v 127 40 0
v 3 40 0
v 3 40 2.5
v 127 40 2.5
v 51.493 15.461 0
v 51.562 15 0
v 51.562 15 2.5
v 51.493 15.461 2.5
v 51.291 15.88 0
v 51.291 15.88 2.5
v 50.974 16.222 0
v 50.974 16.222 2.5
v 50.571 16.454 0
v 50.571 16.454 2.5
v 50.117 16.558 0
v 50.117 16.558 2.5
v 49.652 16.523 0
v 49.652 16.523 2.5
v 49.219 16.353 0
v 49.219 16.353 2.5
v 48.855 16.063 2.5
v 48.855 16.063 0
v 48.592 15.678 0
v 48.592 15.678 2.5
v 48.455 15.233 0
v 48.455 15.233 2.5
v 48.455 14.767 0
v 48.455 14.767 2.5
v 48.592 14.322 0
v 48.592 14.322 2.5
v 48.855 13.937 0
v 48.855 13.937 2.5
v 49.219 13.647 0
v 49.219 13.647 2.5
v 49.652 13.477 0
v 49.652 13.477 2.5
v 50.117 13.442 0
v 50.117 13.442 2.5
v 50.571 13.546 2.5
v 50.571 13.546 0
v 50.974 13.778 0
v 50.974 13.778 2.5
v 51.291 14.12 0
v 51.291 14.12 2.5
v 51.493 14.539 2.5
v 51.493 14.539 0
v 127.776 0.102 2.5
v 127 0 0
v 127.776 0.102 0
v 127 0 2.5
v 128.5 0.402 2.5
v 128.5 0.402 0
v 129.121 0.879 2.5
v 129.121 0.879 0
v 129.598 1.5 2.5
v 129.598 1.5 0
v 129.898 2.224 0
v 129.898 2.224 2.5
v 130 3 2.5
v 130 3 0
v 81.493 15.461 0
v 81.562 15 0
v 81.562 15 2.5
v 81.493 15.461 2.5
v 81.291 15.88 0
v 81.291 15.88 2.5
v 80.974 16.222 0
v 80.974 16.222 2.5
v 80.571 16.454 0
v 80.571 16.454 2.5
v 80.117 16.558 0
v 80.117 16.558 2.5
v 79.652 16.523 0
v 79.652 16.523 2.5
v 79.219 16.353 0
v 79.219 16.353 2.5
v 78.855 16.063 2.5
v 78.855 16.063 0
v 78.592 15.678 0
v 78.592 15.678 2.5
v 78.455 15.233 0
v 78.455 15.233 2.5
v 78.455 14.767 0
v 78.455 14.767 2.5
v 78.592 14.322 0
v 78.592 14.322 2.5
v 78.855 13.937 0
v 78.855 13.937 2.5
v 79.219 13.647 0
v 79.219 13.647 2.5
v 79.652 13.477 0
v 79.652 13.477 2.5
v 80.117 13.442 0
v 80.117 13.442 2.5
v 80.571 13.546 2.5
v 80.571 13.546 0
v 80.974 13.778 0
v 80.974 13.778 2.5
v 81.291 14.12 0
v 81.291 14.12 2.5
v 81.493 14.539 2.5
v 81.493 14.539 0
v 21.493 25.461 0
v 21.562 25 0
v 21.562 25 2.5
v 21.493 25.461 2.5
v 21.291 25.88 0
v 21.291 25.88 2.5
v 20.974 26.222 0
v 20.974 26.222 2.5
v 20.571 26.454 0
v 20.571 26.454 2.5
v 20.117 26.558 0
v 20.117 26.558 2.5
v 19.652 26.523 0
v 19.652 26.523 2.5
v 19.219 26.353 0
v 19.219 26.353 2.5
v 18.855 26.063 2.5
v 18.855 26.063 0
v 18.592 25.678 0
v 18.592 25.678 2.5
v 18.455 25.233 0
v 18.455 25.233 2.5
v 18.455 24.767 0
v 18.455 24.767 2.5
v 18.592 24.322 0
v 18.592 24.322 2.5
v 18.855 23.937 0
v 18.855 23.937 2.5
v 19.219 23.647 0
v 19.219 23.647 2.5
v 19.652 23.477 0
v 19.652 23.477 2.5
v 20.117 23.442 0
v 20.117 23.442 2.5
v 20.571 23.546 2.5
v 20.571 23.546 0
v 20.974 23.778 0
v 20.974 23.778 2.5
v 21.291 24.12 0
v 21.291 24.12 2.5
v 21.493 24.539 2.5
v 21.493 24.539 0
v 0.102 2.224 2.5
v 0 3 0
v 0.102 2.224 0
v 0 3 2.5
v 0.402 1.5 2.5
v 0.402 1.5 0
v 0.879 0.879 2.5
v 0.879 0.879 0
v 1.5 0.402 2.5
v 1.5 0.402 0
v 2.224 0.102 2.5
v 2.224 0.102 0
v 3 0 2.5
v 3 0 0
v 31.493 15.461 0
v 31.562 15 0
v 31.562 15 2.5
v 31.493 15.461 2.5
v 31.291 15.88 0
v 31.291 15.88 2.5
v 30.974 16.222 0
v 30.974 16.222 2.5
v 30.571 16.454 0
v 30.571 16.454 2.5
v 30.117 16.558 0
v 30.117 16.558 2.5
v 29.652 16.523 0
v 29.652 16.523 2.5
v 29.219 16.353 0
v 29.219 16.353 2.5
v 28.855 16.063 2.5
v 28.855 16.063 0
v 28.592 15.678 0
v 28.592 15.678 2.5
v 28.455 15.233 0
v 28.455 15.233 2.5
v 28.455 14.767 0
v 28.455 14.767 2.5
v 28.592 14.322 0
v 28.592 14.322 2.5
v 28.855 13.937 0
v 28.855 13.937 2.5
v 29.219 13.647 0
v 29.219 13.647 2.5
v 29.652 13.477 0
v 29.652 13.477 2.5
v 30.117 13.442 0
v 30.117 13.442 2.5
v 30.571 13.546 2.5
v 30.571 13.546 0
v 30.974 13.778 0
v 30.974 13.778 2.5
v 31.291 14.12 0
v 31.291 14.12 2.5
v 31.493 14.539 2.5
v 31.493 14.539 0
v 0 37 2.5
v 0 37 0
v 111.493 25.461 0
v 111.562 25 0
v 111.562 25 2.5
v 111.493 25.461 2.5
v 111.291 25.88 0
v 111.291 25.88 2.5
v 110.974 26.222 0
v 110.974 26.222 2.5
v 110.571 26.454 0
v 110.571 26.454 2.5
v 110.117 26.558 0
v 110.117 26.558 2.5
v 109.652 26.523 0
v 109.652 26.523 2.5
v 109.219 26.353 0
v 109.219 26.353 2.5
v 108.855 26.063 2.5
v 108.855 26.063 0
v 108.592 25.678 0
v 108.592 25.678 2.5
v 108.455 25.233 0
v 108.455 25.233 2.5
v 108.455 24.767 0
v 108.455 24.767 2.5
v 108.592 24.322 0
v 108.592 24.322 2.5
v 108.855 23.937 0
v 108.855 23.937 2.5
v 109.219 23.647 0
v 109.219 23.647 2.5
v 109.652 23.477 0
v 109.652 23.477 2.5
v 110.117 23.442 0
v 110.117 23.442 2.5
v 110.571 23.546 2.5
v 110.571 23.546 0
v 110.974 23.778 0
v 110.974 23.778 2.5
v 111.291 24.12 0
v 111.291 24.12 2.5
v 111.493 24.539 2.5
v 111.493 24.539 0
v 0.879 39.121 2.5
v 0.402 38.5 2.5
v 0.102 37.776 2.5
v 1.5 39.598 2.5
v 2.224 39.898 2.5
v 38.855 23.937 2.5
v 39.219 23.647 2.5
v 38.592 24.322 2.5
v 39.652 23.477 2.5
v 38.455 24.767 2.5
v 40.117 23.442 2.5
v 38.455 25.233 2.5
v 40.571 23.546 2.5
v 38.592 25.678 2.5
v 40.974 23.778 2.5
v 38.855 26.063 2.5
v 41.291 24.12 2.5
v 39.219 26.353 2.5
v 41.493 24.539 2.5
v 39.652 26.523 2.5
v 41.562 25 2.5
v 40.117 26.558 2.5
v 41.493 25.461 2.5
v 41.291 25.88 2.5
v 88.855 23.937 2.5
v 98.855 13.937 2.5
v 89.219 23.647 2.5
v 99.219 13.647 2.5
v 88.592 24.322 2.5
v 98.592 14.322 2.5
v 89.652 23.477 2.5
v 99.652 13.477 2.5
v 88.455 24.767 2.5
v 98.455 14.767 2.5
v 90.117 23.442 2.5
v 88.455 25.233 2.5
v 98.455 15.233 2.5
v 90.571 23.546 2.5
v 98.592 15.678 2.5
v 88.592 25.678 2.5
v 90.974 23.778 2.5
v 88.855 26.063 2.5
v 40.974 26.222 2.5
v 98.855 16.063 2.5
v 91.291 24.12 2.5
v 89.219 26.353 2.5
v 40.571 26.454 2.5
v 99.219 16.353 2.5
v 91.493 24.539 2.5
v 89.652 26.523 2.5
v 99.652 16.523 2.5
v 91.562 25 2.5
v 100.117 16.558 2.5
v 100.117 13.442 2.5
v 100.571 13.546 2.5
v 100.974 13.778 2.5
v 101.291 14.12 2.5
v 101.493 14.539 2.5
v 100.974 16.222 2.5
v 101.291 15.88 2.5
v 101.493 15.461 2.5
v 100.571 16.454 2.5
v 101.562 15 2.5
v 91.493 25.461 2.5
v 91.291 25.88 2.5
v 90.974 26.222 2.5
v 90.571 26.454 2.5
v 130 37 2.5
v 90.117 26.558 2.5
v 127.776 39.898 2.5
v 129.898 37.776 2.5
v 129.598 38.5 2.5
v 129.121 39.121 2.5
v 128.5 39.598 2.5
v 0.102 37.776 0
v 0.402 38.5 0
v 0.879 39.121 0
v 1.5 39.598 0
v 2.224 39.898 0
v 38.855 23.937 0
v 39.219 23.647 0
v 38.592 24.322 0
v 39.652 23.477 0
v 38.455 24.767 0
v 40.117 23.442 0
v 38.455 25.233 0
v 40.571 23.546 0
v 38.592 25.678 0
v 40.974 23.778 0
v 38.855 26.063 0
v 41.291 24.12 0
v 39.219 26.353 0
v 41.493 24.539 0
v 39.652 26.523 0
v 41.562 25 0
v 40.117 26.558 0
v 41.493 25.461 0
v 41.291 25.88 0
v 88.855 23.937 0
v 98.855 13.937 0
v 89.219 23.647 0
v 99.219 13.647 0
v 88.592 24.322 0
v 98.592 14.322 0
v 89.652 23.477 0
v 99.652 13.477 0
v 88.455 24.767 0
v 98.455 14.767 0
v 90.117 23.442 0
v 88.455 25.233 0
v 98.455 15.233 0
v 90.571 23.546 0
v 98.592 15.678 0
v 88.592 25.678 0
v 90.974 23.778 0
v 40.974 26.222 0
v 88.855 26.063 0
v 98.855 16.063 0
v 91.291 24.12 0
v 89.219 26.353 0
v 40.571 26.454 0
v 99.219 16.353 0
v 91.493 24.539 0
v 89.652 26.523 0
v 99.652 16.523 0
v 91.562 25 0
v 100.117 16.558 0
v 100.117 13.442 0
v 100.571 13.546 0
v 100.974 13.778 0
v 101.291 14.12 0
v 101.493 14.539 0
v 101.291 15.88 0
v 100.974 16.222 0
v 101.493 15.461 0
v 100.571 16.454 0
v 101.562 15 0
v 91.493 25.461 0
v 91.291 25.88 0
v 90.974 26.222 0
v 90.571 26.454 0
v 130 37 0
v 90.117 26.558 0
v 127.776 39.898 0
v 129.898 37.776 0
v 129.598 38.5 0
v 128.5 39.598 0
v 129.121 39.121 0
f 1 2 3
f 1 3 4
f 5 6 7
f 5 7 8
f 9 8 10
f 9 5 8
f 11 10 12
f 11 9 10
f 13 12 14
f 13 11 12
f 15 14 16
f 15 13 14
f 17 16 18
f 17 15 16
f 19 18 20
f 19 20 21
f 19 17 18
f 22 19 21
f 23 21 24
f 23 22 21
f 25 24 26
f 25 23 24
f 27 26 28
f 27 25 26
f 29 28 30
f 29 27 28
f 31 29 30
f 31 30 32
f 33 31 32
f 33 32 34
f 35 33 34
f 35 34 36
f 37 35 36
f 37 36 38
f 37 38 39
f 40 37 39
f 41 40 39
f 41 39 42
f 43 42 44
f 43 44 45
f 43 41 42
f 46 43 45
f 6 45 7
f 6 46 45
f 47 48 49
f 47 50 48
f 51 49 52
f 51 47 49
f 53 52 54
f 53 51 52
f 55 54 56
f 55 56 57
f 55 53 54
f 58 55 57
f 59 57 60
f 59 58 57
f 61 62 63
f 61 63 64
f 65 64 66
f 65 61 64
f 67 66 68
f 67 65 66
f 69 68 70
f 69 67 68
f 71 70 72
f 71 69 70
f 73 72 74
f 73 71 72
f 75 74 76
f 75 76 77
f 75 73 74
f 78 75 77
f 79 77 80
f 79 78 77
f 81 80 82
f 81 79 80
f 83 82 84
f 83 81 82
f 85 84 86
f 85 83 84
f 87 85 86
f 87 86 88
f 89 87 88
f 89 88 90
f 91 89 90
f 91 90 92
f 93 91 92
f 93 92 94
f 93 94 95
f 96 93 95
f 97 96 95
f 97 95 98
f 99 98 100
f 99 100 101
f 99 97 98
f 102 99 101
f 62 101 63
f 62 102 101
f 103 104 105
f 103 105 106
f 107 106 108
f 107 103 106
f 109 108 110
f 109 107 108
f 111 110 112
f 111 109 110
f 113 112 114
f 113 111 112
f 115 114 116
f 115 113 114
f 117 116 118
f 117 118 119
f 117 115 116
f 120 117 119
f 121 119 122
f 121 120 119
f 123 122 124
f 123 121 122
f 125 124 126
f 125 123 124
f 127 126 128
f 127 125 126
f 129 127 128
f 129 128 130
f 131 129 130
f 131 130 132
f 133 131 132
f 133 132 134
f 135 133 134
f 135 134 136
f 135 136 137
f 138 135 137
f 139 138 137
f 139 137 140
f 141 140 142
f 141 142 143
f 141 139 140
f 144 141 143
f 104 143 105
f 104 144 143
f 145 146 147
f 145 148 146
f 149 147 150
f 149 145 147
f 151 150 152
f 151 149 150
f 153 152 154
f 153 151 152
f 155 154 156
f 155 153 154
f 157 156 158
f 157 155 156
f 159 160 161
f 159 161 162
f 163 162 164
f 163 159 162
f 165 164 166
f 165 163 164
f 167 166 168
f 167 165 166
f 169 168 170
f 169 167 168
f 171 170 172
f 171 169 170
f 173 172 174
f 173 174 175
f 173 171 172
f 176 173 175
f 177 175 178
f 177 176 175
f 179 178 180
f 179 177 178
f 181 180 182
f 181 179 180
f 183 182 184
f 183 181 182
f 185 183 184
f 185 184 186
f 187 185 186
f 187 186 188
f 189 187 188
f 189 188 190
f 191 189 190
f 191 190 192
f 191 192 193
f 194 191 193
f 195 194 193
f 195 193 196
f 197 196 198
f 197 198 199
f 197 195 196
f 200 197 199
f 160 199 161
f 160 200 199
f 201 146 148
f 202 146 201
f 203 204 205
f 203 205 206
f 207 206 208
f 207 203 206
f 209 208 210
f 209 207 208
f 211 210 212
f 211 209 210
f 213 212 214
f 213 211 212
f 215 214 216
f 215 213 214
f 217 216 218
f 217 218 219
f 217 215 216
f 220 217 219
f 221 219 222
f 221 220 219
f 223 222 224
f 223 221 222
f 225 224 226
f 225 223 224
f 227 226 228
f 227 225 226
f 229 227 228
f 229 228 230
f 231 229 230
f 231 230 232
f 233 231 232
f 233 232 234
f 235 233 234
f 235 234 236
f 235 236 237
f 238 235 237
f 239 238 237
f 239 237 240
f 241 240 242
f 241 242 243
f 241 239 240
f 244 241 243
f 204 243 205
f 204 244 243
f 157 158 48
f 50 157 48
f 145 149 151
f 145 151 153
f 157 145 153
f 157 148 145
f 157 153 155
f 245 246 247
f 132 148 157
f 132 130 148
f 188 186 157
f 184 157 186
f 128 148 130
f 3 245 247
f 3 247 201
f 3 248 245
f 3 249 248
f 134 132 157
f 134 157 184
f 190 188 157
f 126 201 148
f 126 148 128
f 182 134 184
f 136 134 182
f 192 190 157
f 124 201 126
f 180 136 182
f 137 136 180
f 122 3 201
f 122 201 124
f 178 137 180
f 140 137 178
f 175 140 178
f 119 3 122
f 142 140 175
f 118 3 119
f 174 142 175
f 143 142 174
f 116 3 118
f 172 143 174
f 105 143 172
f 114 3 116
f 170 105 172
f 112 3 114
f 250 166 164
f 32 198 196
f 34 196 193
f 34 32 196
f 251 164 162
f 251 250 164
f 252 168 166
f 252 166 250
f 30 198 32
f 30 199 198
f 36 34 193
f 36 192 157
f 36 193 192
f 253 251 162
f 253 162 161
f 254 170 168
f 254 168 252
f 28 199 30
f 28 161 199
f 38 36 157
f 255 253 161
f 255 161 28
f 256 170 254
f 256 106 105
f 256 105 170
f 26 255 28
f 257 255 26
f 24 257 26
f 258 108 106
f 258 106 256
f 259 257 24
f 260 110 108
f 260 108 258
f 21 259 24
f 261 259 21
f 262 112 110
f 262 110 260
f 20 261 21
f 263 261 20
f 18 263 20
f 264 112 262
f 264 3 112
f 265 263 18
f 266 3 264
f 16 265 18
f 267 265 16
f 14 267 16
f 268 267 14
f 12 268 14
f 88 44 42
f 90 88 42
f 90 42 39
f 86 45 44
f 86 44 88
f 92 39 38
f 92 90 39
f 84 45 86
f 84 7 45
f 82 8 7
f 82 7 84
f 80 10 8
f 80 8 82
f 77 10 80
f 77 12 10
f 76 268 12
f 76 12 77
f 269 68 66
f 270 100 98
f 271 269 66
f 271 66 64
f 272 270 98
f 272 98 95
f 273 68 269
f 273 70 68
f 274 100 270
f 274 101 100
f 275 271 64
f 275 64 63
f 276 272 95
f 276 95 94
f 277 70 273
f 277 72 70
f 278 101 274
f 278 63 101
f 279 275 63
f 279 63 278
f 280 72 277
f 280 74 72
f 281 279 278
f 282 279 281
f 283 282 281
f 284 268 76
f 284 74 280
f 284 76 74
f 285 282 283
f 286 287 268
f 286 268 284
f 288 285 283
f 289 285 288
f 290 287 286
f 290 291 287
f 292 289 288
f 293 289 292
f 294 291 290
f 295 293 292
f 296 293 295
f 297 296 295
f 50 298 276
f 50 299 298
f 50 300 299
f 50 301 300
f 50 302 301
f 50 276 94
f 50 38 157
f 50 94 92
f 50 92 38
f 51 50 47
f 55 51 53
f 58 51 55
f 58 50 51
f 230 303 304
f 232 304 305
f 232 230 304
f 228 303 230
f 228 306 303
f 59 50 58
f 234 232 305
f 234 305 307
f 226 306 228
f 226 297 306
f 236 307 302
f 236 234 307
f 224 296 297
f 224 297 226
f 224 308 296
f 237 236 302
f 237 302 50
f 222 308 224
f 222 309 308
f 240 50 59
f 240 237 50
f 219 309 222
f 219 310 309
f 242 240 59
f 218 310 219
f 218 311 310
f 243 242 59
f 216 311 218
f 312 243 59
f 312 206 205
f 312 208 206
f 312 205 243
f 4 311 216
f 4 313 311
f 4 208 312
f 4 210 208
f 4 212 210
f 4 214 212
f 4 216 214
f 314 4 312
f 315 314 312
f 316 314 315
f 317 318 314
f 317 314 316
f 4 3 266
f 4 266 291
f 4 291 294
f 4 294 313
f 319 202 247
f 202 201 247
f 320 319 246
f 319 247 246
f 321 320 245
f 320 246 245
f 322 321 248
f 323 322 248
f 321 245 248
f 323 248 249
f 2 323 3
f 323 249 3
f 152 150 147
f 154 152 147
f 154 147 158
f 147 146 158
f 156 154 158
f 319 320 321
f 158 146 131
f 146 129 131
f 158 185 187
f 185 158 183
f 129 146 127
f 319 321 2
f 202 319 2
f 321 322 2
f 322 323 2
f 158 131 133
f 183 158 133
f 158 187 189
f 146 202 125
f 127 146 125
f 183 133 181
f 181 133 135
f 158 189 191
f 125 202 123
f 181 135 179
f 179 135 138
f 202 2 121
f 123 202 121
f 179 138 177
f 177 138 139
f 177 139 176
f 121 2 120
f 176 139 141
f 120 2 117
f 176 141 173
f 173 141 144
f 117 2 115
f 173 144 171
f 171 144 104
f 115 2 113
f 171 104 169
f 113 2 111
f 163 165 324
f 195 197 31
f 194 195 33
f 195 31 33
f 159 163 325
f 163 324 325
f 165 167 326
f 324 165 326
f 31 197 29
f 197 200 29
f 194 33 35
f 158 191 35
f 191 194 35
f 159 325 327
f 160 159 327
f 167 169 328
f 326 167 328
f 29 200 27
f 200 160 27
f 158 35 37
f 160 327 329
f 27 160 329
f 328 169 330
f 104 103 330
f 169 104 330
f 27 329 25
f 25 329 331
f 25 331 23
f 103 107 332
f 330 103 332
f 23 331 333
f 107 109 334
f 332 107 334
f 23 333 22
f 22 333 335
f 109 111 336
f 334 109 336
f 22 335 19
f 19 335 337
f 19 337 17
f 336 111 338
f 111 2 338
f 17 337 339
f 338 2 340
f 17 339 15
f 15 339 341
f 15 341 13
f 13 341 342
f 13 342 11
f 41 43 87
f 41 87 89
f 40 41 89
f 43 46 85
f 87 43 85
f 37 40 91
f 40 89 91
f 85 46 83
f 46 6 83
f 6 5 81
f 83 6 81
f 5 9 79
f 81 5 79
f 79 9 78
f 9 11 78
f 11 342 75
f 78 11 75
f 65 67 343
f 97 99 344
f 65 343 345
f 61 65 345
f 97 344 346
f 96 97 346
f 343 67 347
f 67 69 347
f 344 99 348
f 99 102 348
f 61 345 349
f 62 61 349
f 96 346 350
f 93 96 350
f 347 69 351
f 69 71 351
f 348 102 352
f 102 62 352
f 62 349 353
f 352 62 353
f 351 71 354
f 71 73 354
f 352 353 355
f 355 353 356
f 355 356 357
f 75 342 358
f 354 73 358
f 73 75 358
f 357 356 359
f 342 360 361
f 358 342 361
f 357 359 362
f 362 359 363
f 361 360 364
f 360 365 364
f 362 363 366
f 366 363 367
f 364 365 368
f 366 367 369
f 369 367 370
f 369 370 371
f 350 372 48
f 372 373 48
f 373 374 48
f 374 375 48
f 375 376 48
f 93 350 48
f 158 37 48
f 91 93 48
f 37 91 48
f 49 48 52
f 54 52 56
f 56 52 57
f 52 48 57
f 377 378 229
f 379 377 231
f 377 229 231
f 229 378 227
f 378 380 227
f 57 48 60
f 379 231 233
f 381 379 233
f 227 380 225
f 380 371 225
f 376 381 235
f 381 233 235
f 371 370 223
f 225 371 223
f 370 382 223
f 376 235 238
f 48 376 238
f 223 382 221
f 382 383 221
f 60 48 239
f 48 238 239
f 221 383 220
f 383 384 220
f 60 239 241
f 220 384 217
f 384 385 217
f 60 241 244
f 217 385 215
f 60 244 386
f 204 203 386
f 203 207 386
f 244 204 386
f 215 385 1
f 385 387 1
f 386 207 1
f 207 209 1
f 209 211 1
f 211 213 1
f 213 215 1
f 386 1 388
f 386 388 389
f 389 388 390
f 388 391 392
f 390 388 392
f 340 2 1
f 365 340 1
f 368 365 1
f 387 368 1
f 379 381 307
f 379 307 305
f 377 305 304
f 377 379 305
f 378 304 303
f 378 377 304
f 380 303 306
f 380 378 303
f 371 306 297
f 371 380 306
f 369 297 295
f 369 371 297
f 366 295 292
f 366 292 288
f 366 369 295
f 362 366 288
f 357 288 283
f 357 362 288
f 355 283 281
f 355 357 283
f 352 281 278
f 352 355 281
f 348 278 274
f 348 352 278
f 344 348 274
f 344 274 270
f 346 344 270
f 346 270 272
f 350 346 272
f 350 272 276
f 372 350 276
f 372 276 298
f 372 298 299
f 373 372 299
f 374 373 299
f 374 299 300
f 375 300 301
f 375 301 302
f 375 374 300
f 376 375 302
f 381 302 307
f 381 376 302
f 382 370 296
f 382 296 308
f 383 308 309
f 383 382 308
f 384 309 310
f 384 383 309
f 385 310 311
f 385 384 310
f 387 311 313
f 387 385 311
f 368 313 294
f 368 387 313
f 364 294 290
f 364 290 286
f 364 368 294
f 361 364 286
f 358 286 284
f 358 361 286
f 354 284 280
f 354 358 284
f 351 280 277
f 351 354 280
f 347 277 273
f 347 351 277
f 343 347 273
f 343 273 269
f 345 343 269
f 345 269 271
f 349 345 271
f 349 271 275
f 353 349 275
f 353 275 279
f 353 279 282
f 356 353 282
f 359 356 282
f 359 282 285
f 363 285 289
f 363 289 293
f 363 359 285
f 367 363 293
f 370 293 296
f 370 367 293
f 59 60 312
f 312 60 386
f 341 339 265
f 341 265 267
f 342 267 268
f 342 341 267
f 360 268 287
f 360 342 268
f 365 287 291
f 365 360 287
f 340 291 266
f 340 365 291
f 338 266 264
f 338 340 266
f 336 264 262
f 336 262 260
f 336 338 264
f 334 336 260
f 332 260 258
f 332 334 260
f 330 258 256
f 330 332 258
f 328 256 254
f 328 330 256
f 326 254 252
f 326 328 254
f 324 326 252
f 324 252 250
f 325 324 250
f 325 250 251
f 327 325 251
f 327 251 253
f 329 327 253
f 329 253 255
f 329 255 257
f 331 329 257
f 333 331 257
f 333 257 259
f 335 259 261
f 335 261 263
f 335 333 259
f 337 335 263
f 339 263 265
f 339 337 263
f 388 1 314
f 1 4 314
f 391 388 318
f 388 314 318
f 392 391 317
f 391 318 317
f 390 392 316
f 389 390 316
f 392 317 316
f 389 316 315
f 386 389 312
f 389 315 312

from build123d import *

# Parameters (mm, degrees)
SKETCH_W  = 130
SKETCH_H  = 40
SKETCH_R  = 1.5625
PAD_DEPTH = 2.5
FILLET_R  = 3


with BuildPart() as part:
    # Sketch → Pad (new body)
    with BuildSketch(Plane.XY):
        with Locations((65, 20)):
            Rectangle(SKETCH_W, SKETCH_H)
        with Locations((20, 25)):
            Circle(SKETCH_R, mode=Mode.SUBTRACT)
        with Locations((40, 25)):
            Circle(SKETCH_R, mode=Mode.SUBTRACT)
        with Locations((30, 15)):
            Circle(SKETCH_R, mode=Mode.SUBTRACT)
        with Locations((50, 15)):
            Circle(SKETCH_R, mode=Mode.SUBTRACT)
        with Locations((110, 25)):
            Circle(SKETCH_R, mode=Mode.SUBTRACT)
        with Locations((90, 25)):
            Circle(SKETCH_R, mode=Mode.SUBTRACT)
        with Locations((100, 15)):
            Circle(SKETCH_R, mode=Mode.SUBTRACT)
        with Locations((80, 15)):
            Circle(SKETCH_R, mode=Mode.SUBTRACT)
    extrude(amount=PAD_DEPTH)

    # Fillet
    fillet_edges = [part.edges().sort_by_distance(p)[0] for p in [
        (0, 0, 1.25),
        (130, 0, 1.25),
        (130, 40, 1.25),
        (0, 40, 1.25),
    ]]
    fillet(fillet_edges, radius=FILLET_R)


solid = part.part
